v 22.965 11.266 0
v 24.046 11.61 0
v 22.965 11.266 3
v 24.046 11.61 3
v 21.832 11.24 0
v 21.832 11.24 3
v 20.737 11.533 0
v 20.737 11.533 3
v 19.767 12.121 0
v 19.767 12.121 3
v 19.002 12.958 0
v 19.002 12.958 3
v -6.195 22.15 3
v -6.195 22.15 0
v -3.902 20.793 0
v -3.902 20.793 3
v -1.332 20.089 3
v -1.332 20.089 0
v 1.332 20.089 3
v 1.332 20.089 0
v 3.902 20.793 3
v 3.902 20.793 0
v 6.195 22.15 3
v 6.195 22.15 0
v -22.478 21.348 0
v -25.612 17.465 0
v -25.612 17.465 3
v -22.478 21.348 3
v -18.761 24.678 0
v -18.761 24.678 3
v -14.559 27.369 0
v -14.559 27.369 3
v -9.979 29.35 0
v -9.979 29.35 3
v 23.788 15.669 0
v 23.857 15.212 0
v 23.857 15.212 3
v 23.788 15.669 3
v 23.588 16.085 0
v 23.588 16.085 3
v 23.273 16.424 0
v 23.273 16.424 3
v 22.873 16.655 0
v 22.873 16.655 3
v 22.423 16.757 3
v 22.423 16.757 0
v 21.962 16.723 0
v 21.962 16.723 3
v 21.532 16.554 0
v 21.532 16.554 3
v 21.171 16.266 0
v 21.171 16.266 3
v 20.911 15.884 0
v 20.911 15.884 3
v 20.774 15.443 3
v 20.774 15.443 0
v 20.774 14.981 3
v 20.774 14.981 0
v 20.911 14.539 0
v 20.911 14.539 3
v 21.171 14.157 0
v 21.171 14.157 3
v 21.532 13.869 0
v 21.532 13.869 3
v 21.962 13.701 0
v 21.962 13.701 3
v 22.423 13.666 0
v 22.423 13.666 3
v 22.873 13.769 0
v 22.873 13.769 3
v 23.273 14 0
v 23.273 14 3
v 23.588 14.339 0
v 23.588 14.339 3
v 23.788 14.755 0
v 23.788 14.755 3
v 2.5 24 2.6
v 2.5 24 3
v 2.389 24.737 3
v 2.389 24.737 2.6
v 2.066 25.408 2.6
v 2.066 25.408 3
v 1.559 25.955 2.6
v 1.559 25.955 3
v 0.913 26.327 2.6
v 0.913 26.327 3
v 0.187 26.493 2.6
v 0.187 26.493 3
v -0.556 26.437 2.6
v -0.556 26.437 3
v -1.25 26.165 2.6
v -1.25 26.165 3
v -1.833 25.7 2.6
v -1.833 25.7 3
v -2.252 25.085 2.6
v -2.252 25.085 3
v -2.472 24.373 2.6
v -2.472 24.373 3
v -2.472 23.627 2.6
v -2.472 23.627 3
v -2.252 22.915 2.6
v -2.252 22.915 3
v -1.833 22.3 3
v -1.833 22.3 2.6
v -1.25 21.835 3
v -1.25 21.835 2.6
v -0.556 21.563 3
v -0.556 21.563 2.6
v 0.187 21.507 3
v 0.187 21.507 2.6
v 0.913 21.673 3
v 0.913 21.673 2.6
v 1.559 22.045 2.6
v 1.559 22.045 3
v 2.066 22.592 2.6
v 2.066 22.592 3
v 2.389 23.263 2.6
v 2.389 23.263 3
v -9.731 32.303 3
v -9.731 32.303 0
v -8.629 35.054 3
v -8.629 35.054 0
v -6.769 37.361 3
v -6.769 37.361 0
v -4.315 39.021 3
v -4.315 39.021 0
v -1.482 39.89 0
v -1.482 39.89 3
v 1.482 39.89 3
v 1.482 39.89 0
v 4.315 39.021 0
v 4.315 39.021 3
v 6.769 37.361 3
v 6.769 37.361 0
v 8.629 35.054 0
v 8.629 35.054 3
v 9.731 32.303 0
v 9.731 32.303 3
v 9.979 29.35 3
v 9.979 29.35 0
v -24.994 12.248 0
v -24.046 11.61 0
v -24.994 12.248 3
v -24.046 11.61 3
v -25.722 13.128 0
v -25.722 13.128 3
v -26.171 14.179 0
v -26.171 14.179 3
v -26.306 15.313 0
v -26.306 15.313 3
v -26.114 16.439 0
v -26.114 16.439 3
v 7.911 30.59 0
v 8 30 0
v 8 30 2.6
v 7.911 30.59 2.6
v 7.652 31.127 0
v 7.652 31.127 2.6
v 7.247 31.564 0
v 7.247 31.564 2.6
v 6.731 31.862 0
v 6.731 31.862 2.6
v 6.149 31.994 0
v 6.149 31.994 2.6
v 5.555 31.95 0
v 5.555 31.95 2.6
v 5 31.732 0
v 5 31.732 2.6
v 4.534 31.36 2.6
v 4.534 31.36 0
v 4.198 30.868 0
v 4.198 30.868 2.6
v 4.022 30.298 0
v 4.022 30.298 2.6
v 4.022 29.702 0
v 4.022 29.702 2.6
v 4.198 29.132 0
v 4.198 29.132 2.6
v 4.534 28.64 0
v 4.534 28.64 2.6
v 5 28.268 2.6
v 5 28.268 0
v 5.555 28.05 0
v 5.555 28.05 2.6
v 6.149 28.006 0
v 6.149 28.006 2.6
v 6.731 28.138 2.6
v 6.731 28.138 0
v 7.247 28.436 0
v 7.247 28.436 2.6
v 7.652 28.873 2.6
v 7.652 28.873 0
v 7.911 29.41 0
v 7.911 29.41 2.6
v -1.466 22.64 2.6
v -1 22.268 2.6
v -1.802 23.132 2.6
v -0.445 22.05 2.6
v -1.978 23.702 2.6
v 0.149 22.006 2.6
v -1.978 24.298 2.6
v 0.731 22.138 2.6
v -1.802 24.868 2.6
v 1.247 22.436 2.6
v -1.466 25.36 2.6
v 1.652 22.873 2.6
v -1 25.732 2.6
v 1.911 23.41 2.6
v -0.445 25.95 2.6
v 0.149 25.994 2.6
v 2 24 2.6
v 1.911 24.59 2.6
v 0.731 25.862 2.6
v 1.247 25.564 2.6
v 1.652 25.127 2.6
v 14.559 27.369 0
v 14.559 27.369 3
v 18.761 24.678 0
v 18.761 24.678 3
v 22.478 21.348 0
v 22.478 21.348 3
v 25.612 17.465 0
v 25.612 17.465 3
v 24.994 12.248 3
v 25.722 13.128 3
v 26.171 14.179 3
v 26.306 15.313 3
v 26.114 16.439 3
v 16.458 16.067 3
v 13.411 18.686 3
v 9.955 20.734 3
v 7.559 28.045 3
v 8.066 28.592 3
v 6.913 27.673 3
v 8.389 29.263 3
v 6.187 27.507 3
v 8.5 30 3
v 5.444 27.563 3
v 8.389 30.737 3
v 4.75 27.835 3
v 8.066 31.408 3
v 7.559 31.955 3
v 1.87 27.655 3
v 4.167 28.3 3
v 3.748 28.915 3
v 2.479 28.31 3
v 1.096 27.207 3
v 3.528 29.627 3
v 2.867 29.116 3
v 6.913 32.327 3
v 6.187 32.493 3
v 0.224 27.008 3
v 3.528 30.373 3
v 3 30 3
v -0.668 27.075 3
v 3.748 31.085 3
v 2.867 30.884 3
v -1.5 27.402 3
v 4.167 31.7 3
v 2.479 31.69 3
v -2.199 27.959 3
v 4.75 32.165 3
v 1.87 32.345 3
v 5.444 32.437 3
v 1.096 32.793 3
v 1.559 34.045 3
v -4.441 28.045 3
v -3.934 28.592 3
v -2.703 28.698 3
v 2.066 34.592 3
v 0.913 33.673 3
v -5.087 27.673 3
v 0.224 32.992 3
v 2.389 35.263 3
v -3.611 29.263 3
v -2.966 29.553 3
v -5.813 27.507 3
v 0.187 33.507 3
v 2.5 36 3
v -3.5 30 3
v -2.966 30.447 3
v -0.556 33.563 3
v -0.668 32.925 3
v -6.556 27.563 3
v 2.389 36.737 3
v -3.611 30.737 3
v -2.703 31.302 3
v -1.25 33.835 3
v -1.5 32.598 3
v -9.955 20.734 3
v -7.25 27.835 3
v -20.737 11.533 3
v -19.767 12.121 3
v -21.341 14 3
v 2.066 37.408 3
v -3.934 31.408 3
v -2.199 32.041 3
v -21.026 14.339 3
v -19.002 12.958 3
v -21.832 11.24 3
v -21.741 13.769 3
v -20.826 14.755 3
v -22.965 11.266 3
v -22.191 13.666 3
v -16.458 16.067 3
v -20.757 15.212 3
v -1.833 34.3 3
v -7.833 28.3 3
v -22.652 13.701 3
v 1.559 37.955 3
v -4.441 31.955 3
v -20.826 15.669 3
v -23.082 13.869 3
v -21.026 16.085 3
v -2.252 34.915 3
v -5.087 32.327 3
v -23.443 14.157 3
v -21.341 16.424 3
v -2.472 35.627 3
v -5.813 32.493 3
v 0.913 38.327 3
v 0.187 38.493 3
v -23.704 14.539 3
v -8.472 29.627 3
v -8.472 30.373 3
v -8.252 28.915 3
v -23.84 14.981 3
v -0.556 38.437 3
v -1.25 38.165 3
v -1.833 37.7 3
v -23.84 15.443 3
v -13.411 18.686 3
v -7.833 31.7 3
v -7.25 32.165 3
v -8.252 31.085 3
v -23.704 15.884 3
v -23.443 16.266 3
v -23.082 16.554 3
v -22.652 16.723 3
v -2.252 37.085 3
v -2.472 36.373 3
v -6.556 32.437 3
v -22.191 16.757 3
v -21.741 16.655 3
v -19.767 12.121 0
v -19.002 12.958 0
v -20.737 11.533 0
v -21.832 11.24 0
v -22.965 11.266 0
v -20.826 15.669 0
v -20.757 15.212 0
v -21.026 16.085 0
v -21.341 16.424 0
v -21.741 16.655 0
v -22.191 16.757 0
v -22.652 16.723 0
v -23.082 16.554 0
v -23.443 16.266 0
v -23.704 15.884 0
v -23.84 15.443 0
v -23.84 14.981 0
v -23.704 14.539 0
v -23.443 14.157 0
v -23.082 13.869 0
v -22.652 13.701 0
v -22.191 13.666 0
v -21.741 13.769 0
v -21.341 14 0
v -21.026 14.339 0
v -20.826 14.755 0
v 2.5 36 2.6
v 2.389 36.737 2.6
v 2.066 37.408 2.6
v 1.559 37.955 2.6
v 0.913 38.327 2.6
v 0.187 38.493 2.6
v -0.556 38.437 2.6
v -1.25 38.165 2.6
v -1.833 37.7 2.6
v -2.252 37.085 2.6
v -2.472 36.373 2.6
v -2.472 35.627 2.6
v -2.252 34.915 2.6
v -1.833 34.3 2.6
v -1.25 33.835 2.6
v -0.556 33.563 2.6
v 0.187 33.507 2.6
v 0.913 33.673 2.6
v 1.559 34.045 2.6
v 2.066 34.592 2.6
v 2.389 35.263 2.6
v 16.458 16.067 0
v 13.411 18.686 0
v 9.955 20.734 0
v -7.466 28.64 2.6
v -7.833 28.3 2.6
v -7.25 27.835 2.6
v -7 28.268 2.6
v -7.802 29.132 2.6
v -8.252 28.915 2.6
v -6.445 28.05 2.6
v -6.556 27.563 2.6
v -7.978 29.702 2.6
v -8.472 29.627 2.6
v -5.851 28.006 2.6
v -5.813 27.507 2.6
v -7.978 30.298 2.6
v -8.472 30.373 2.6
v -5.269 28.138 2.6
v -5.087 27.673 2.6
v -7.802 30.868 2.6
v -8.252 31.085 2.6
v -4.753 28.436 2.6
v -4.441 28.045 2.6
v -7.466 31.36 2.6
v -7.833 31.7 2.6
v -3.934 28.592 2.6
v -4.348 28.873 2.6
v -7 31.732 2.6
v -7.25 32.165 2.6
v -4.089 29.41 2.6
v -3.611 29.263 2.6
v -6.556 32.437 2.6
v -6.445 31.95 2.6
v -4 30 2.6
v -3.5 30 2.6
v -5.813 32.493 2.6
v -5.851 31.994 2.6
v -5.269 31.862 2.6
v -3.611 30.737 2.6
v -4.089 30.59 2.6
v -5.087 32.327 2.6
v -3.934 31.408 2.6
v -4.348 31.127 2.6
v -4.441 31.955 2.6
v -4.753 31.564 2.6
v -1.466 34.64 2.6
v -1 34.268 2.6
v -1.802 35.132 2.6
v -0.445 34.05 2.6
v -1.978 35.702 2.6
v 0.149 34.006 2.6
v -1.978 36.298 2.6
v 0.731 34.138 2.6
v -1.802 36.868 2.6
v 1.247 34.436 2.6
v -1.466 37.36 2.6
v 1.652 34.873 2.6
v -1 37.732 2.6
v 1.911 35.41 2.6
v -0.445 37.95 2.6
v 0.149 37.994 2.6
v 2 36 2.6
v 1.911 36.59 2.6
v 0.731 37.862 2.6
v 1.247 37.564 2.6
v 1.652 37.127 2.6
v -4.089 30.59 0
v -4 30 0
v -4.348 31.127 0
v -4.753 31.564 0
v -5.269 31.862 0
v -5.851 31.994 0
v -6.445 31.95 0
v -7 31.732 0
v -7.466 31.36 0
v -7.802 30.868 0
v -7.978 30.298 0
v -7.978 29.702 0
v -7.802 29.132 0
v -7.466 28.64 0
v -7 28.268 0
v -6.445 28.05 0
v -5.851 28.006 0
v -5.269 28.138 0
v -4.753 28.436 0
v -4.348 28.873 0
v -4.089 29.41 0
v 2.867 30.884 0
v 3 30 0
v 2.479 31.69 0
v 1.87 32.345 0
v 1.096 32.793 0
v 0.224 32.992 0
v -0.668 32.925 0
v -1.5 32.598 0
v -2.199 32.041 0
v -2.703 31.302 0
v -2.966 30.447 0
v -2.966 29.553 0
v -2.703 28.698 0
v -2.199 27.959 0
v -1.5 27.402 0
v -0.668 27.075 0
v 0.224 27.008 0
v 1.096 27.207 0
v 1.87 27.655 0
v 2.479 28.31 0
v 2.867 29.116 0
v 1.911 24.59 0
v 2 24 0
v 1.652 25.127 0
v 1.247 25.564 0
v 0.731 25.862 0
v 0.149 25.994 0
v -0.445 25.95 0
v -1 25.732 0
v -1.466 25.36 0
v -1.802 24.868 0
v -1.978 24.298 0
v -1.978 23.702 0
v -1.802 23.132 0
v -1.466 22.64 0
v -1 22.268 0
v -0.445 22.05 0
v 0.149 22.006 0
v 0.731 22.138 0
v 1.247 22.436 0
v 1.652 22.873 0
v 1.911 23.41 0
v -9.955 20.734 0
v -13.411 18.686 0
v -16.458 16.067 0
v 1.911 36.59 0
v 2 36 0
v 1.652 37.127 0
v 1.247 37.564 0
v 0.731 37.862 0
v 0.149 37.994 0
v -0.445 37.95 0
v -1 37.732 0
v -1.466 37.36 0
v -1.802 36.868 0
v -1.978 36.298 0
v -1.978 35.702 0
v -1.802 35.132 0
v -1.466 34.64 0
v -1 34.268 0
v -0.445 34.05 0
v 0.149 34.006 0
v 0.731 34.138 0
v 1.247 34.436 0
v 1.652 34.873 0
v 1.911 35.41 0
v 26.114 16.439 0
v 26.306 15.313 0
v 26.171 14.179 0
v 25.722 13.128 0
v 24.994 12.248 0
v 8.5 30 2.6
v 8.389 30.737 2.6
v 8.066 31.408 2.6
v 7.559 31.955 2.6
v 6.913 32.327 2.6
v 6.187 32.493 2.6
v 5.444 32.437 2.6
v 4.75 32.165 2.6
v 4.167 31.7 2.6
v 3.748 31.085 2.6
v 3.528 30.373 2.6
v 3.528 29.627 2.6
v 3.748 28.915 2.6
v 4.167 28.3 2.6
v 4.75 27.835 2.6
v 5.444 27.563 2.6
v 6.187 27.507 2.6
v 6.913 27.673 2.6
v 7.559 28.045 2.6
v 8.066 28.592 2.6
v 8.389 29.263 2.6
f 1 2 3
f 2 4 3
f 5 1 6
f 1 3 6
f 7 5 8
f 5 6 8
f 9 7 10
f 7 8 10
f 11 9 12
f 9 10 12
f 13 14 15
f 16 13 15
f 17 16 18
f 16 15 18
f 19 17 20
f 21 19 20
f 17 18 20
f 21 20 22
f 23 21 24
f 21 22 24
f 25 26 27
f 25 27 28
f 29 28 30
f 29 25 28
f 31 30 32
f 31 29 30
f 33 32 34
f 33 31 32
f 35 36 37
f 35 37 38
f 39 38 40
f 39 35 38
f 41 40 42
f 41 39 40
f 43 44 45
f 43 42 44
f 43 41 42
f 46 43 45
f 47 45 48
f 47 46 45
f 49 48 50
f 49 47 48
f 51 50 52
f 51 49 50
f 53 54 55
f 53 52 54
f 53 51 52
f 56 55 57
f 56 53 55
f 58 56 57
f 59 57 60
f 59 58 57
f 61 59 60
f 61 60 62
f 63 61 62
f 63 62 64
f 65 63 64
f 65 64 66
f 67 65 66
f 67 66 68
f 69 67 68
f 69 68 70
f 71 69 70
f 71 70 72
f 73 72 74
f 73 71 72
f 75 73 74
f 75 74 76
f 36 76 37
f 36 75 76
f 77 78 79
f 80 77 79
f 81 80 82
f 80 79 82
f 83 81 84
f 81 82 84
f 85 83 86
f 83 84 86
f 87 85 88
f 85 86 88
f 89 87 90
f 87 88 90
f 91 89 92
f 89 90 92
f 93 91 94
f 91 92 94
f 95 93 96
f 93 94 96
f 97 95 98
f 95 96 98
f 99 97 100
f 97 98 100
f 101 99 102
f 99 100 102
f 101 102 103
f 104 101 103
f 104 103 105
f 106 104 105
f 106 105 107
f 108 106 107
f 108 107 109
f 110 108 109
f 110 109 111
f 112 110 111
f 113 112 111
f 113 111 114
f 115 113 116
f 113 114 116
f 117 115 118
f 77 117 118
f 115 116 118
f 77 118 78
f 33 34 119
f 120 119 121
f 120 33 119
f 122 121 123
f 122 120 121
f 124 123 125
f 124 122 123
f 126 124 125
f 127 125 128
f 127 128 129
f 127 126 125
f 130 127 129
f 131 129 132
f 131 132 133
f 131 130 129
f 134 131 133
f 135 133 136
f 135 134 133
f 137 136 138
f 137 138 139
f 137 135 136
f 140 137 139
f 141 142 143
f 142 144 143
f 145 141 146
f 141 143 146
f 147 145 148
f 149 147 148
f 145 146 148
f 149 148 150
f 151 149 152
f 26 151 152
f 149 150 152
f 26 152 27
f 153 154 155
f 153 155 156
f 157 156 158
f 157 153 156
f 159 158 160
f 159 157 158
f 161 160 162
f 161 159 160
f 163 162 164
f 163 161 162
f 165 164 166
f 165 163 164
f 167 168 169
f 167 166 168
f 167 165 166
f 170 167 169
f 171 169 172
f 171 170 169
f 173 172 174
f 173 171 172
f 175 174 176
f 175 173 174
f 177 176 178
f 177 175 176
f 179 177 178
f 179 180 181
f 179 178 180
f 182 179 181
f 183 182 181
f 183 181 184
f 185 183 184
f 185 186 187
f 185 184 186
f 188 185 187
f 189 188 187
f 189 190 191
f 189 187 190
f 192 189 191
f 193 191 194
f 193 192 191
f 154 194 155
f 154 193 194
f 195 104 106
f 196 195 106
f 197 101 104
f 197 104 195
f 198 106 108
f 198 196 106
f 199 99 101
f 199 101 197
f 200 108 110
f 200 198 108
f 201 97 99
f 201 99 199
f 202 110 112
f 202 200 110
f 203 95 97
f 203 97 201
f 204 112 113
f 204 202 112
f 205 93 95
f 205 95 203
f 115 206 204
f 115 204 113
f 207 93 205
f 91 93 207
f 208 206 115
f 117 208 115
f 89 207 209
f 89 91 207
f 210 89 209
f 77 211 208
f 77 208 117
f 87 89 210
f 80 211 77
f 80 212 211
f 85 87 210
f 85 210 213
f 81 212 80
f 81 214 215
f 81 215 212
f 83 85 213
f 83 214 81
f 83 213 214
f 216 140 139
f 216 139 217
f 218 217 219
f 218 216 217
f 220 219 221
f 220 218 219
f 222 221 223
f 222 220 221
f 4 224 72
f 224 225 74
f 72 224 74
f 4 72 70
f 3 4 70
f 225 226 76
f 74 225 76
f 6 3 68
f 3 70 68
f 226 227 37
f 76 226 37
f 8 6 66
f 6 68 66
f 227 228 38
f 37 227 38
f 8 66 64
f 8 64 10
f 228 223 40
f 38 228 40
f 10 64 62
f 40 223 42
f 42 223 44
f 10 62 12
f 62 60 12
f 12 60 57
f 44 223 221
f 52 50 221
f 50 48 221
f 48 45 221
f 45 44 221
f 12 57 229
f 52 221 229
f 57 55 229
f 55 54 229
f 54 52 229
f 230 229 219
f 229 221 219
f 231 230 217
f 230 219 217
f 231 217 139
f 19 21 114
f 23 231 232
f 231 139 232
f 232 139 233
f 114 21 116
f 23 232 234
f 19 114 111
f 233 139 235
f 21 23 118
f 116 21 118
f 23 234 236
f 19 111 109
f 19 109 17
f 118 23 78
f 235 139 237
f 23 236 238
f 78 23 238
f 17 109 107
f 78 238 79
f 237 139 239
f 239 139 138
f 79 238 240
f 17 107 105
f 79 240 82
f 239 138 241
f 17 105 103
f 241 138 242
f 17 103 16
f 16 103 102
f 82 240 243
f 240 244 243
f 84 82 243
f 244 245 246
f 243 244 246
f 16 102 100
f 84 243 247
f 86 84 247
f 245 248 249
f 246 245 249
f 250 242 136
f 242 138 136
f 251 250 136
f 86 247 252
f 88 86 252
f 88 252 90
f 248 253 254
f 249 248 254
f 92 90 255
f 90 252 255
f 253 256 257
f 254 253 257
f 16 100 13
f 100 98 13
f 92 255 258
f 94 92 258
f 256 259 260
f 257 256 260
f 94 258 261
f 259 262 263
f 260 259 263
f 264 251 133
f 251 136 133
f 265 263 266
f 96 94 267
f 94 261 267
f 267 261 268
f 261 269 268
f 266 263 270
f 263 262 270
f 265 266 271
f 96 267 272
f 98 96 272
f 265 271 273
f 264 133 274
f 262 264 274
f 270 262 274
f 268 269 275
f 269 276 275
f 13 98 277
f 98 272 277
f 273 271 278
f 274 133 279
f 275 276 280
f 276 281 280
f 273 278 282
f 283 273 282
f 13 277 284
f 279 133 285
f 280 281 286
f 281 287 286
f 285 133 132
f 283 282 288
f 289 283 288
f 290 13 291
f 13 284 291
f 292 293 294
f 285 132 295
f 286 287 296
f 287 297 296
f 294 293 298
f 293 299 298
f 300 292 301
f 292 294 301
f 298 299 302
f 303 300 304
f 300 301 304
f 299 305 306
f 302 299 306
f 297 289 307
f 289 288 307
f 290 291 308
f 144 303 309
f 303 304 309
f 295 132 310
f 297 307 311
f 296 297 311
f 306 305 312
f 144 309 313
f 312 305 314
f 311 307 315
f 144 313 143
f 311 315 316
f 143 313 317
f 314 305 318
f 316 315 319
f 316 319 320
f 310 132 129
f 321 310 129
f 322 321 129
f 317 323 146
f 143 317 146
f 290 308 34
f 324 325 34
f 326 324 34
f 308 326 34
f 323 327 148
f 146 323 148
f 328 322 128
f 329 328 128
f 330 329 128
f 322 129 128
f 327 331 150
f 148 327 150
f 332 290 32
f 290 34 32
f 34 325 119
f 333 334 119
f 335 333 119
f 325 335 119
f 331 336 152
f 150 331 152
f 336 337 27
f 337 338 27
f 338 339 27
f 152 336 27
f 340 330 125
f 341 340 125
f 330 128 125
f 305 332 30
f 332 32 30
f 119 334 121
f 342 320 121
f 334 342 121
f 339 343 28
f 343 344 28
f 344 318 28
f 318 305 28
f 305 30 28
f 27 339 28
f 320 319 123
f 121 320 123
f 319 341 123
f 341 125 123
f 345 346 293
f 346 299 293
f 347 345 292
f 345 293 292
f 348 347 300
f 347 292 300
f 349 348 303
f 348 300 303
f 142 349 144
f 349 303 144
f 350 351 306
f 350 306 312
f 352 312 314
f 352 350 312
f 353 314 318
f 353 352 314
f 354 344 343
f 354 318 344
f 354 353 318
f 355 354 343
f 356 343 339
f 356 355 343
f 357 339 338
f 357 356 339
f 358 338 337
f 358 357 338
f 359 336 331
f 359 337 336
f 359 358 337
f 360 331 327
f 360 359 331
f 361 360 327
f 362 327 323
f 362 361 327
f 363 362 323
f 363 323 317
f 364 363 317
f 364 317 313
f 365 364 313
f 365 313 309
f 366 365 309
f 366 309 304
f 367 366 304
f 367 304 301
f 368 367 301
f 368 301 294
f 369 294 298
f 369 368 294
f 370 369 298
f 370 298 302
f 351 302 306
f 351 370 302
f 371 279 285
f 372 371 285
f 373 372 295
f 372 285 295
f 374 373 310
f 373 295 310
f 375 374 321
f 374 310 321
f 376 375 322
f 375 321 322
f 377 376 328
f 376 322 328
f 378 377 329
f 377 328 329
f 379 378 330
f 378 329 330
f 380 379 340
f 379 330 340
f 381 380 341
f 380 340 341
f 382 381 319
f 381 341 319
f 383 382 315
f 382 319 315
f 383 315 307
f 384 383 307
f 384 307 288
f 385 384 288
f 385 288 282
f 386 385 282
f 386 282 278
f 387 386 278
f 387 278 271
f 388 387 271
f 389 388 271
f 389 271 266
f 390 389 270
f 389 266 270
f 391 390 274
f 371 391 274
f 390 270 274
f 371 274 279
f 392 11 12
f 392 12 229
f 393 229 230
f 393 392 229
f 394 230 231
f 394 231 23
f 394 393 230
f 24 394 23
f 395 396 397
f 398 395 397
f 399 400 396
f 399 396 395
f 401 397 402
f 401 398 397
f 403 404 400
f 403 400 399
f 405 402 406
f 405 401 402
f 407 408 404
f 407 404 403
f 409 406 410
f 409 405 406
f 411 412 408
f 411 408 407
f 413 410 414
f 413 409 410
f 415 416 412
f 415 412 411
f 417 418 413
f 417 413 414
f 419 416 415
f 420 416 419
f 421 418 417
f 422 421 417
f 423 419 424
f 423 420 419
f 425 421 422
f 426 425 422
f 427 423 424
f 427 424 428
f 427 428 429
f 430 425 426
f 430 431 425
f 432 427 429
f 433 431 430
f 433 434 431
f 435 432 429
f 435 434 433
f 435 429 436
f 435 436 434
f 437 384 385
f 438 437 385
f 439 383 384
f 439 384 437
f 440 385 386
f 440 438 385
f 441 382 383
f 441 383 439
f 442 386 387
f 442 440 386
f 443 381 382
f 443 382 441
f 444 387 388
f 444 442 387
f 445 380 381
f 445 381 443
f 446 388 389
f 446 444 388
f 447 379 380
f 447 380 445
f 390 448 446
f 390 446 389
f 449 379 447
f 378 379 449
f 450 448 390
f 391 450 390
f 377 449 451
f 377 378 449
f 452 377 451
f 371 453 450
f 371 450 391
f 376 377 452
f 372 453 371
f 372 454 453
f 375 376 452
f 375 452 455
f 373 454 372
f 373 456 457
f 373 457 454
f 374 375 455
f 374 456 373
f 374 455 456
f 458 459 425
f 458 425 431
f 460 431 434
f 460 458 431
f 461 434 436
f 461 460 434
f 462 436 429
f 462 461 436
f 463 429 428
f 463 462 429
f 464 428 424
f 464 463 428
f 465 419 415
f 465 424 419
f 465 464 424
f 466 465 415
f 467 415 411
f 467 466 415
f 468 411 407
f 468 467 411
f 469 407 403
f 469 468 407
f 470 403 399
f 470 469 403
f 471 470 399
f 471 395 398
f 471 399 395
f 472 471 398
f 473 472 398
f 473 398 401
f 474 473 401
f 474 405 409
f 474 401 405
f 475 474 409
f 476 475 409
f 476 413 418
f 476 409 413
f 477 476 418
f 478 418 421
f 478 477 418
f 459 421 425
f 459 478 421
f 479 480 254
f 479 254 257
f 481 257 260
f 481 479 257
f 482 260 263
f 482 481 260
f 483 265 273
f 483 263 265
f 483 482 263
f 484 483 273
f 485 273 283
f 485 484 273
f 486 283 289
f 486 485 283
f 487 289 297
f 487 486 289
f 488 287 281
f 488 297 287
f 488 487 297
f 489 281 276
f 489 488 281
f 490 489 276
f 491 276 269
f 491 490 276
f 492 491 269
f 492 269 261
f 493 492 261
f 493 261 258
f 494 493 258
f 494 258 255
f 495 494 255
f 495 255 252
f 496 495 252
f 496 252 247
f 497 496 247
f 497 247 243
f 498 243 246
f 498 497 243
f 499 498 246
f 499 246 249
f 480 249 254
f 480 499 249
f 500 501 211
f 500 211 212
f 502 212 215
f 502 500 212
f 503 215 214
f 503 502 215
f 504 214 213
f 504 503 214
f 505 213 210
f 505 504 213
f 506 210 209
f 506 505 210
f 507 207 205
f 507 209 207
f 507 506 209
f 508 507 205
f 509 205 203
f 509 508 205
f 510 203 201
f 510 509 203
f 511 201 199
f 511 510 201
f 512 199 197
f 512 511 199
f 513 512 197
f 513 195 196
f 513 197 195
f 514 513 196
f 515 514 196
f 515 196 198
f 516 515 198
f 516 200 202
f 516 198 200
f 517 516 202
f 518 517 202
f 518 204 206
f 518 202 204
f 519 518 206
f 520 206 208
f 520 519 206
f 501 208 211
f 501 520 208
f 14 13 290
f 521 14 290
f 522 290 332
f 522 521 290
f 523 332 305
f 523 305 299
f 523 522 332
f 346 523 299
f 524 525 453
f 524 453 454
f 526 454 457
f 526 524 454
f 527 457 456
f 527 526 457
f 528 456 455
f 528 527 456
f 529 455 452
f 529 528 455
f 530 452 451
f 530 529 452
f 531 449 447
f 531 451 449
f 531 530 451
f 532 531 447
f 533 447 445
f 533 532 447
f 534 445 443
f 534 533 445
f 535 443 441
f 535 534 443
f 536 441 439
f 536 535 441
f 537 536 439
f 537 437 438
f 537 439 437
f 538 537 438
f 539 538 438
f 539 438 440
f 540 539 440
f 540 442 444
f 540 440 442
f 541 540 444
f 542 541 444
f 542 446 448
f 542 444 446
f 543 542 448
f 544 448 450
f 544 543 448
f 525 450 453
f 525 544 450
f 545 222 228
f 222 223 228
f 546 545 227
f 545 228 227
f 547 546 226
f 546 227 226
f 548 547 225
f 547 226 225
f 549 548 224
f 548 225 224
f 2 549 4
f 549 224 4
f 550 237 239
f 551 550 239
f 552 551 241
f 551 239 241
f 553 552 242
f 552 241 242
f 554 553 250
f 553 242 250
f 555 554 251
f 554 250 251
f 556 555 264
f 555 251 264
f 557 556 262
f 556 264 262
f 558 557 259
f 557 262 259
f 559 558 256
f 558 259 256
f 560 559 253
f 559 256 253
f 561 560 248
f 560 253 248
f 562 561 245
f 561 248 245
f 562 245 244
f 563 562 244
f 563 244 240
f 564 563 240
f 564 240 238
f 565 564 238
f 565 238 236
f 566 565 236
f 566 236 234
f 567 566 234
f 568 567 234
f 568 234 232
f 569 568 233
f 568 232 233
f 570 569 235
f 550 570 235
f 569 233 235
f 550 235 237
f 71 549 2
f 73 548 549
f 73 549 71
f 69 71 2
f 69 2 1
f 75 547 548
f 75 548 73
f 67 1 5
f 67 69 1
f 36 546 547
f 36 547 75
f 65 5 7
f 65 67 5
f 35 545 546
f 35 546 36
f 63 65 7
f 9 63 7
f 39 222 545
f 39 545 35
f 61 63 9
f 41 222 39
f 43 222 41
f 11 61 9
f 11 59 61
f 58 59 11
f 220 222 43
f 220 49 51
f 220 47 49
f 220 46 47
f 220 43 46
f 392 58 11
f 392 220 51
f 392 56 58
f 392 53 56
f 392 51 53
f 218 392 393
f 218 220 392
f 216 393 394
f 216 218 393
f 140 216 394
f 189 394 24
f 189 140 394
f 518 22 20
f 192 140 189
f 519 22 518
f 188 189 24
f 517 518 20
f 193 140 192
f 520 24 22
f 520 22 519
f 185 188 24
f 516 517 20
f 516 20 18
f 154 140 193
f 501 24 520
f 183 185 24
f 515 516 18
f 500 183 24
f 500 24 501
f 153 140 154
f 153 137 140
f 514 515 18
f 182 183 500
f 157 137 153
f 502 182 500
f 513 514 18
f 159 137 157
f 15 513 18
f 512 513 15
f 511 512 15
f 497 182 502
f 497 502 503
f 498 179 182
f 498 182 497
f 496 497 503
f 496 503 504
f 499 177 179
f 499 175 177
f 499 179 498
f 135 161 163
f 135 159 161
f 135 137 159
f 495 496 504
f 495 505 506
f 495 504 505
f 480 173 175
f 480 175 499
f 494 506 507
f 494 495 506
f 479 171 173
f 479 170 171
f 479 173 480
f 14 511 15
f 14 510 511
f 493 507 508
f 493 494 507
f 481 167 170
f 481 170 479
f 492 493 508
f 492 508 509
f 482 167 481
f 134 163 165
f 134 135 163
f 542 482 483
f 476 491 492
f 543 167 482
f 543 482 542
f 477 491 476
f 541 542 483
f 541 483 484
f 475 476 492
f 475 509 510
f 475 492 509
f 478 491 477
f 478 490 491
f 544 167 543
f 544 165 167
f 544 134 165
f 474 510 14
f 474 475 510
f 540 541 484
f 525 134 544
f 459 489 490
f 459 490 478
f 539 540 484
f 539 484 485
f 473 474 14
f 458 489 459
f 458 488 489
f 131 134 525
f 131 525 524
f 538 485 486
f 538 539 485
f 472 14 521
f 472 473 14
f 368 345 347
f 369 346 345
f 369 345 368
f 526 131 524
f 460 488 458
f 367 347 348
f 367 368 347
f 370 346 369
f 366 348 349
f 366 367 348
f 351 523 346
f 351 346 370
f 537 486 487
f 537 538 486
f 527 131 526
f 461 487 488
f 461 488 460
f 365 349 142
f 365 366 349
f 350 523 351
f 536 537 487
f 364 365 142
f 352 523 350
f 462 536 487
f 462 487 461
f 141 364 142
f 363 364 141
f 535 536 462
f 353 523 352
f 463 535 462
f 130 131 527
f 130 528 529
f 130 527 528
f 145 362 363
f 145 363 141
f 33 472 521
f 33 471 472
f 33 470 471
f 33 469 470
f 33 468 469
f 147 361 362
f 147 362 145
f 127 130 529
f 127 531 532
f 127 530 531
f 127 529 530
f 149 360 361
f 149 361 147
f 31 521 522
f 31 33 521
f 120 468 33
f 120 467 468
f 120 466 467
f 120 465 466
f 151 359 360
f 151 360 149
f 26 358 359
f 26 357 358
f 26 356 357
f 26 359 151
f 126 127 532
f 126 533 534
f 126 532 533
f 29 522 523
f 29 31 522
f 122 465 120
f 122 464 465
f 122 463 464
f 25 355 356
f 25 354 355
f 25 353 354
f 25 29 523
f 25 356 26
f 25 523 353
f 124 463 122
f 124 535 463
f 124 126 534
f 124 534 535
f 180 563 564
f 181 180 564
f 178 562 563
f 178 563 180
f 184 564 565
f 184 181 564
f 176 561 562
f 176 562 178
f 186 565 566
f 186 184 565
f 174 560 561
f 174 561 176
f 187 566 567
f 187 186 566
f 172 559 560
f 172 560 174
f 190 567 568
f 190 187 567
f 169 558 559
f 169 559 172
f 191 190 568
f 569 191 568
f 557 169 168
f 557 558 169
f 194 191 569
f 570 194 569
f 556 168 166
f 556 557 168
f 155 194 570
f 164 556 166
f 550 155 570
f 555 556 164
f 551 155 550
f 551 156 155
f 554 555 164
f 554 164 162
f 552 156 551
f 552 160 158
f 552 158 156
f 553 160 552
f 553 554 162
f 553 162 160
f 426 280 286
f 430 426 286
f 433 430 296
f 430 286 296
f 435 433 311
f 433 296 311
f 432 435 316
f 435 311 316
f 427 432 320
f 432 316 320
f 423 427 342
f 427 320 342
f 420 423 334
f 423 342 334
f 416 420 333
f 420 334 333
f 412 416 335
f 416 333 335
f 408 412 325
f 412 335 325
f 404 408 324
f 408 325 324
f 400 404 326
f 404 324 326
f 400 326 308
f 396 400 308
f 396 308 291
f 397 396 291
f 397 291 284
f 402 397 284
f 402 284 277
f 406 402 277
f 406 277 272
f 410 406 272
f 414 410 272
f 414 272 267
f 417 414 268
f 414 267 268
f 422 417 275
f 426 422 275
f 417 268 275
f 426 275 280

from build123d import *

# Parameters (mm, degrees)
BOSS_EXTRU_1_DEPTH           = 3
BOSS_EXTRU_2_START           = -3
ESQUISSE3_R                  = 10
BOSS_EXTRU_2_DEPTH           = 3
CONG_1_R                     = 4
ENL_V_MAT_EXTRU_1_DEPTH      = 48.969384742
ENL_V_MAT_EXTRU_1_DEPTH_BACK = 48.969384742
ESQUISSE2_R                  = 3
ESQUISSE2_R_2                = 2
ENL_V_MAT_EXTRU_2_DEPTH      = 48.969384742
ENL_V_MAT_EXTRU_2_DEPTH_BACK = 48.969384742
ESQUISSE4_R                  = 1.55
ESQUISSE5_R                  = 2.5
ENL_V_MAT_EXTRU_3_DEPTH      = 0.4


with BuildPart() as part:
    # Esquisse1 → Boss.-Extru.1 (new body)
    with BuildSketch(Plane.XY):
        with BuildLine():
            Line((27.916598717, 13.47826087), (20.712315177, 10))
            ThreePointArc((20.712315177, 10), (0, 23), (-20.712315177, 10))
            Line((-20.712315177, 10), (-27.916598717, 13.47826087))
            ThreePointArc((-27.916598717, 13.47826087), (-20.542500679, 23.216495555), (-9.978852639, 29.35))
            ThreePointArc((-9.978852639, 29.35), (0, 40), (9.978852639, 29.35))
            ThreePointArc((9.978852639, 29.35), (20.542500679, 23.216495555), (27.916598717, 13.47826087))
        make_face()
    extrude(amount=BOSS_EXTRU_1_DEPTH)

    # Esquisse3 → Boss.-Extru.2 (add)
    with BuildSketch(Plane.XY.offset(3).offset(BOSS_EXTRU_2_START)):
        with Locations((0, 30)):
            Circle(ESQUISSE3_R)
    extrude(amount=BOSS_EXTRU_2_DEPTH)

    # Congé1
    cong_1_edges = [part.edges().sort_by_distance(p)[0] for p in [
        (-27.916598717, 13.47826087, 1.5),
        (-20.712315177, 10, 1.5),
        (20.712315177, 10, 1.5),
        (27.916598717, 13.47826087, 1.5),
    ]]
    fillet(cong_1_edges, radius=CONG_1_R - 0.0001)  # a hair under: the kernel refuses the full size

    # Esquisse2 → Enlèv. mat.-Extru.1 (cut, two sides: drawn at the far end of the back side and taken through both)
    with BuildSketch(Plane.XY.offset(3).offset(-ENL_V_MAT_EXTRU_1_DEPTH_BACK)):
        with Locations((0, 30)):
            Circle(ESQUISSE2_R)
        with Locations((6, 30)):
            Circle(ESQUISSE2_R_2)
        with Locations((0, 24)):
            Circle(ESQUISSE2_R_2)
        with Locations((-6, 30)):
            Circle(ESQUISSE2_R_2)
        with Locations((0, 36)):
            Circle(ESQUISSE2_R_2)
    extrude(amount=ENL_V_MAT_EXTRU_1_DEPTH + ENL_V_MAT_EXTRU_1_DEPTH_BACK, mode=Mode.SUBTRACT)

    # Esquisse4 → Enlèv. mat.-Extru.2 (cut, two sides: drawn at the far end of the back side and taken through both)
    with BuildSketch(Plane.XY.offset(3).offset(-ENL_V_MAT_EXTRU_2_DEPTH_BACK)):
        with Locations((22.307020844, 15.211733007)):
            Circle(ESQUISSE4_R)
        with Locations((-22.307020844, 15.211733007)):
            Circle(ESQUISSE4_R)
    extrude(amount=ENL_V_MAT_EXTRU_2_DEPTH + ENL_V_MAT_EXTRU_2_DEPTH_BACK, mode=Mode.SUBTRACT)

    # Esquisse5 → Enlèv. mat.-Extru.3 (cut)
    with BuildSketch(Plane.XY.offset(3)):
        with Locations((0, 24)):
            Circle(ESQUISSE5_R)
        with Locations((6, 30)):
            Circle(ESQUISSE5_R)
        with Locations((0, 36)):
            Circle(ESQUISSE5_R)
        with Locations((-6, 30)):
            Circle(ESQUISSE5_R)
    extrude(amount=-ENL_V_MAT_EXTRU_3_DEPTH, mode=Mode.SUBTRACT)


solid = part.part
